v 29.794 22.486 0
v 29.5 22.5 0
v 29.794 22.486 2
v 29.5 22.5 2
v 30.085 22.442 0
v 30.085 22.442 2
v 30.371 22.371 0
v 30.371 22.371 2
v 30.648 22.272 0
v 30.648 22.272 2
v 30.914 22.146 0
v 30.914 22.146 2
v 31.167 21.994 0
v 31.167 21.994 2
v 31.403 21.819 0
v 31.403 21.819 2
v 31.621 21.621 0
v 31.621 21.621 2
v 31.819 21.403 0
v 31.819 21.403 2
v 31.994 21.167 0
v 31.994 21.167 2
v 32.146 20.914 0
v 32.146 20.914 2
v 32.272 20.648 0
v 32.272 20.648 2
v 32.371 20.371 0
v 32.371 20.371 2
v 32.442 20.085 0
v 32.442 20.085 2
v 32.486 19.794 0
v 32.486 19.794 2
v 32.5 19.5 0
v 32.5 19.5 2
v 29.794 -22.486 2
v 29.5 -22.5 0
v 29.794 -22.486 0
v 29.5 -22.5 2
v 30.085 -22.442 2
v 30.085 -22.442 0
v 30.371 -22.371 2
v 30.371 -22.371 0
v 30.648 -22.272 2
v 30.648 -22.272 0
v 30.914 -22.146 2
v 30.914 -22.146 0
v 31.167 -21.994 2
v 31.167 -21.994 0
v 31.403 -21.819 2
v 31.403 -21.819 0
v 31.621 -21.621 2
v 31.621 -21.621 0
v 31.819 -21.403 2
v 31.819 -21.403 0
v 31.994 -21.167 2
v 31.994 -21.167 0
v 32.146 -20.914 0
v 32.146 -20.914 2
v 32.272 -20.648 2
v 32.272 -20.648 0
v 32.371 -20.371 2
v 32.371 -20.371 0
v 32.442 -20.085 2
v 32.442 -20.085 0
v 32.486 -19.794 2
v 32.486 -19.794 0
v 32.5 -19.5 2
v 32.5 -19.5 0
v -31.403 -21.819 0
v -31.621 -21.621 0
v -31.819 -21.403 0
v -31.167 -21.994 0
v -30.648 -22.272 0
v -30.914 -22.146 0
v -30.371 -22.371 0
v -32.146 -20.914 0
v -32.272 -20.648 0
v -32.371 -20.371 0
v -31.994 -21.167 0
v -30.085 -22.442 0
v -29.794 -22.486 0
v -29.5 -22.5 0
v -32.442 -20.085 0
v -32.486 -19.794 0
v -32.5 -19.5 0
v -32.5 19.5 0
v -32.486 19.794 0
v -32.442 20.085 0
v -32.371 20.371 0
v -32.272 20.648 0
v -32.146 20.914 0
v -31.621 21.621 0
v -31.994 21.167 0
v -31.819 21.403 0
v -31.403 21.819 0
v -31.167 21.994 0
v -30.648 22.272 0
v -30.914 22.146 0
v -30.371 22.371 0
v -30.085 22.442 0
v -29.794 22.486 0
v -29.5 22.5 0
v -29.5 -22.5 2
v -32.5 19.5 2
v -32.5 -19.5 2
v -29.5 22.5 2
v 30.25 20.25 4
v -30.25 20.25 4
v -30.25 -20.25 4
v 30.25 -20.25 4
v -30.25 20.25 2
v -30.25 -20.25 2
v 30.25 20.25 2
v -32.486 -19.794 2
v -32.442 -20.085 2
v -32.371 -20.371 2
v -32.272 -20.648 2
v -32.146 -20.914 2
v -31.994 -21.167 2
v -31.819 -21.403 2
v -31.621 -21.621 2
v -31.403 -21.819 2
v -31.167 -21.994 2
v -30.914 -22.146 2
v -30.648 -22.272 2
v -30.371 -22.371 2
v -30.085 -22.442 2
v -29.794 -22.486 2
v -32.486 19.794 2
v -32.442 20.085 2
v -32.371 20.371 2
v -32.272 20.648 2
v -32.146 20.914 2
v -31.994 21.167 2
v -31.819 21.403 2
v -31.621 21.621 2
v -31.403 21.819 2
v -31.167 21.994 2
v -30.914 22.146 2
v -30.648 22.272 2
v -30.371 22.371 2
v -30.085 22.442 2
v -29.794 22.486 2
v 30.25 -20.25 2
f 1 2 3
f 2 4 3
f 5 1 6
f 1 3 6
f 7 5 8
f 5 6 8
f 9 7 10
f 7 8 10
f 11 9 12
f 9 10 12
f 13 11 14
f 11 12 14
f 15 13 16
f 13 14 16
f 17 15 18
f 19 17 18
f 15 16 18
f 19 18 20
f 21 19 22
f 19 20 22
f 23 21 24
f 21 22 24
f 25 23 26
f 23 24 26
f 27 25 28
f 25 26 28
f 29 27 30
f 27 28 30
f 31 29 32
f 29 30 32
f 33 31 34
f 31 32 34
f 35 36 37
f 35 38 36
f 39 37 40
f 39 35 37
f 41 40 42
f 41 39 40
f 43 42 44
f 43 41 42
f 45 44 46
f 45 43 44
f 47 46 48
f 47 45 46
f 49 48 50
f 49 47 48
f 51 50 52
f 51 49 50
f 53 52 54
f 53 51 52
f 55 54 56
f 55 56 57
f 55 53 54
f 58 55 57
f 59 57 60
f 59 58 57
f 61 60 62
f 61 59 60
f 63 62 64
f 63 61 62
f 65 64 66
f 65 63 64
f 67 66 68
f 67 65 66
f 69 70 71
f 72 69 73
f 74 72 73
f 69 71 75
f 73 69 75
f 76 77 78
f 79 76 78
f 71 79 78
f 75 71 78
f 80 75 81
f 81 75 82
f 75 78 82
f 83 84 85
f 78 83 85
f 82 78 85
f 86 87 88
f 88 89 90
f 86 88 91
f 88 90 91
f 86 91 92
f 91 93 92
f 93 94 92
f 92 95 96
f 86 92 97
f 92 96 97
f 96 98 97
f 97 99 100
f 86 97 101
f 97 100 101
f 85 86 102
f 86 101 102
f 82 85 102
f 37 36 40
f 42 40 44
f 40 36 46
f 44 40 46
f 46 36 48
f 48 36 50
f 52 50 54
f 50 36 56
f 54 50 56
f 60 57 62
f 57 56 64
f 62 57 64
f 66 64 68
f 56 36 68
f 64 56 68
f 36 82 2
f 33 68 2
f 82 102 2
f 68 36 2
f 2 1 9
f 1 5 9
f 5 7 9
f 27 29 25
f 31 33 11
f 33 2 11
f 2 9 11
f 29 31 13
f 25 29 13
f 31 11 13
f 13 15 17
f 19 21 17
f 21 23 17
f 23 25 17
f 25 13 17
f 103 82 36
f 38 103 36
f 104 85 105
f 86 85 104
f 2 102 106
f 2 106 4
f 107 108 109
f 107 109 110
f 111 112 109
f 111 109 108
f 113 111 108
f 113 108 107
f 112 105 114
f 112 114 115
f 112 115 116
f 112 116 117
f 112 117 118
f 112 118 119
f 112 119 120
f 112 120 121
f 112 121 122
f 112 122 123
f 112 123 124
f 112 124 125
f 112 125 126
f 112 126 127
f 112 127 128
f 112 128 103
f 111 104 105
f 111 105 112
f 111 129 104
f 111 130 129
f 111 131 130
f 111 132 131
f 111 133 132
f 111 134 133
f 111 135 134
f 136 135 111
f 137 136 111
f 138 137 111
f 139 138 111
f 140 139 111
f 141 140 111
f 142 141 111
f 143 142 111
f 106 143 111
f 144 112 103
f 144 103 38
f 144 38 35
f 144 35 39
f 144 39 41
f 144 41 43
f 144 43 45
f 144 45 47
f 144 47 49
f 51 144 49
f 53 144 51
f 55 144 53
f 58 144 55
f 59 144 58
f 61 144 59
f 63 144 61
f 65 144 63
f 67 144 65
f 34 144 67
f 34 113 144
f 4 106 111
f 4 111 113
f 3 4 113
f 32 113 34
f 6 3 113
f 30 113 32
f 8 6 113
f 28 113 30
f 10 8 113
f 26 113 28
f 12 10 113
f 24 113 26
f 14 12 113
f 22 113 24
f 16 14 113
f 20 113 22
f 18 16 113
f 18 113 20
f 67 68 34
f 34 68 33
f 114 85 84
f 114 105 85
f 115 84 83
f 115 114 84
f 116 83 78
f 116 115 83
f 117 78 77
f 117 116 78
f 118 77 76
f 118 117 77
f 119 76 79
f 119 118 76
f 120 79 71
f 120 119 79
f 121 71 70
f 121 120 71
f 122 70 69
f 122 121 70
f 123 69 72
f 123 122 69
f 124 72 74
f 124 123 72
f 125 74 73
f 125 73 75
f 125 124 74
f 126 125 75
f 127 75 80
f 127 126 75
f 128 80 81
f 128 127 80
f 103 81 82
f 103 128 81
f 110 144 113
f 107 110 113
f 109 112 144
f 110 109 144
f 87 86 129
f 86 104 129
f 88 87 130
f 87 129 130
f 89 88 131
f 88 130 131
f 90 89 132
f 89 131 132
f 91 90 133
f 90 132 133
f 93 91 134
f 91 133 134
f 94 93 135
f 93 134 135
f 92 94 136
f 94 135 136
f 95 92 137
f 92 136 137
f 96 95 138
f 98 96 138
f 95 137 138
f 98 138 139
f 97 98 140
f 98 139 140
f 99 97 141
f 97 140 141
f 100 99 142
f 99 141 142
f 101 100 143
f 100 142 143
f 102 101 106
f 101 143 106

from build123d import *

# Parameters (mm, degrees)
F0_W     = 65
F0_H     = 45
F0_W_2   = 60.5
F0_H_2   = 40.5
F1_DEPTH = 2
F0_W_3   = 52
F0_H_3   = 32
F2_DEPTH = 4
F3_R     = 3


with BuildPart() as f1:
    # F0 (on Top) → F1 (new body)
    with BuildSketch(Plane.XY):
        Rectangle(F0_W, F0_H)
        Rectangle(F0_W_2, F0_H_2, mode=Mode.SUBTRACT)
    extrude(amount=F1_DEPTH)

    # F0 (on Top) → F2 (join)
    with BuildSketch(Plane.XY):
        Rectangle(F0_W_2, F0_H_2)
        Rectangle(F0_W_3, F0_H_3, mode=Mode.SUBTRACT)
        Rectangle(F0_W_3, F0_H_3)
    extrude(amount=F2_DEPTH)

    # F3
    f3_edges = [f1.edges().sort_by_distance(p)[0] for p in [
        (-32.5, 22.5, 1),
        (32.5, 22.5, 1),
        (32.5, -22.5, 1),
        (-32.5, -22.5, 1),
    ]]
    fillet(f3_edges, radius=F3_R)


solid = f1.part
